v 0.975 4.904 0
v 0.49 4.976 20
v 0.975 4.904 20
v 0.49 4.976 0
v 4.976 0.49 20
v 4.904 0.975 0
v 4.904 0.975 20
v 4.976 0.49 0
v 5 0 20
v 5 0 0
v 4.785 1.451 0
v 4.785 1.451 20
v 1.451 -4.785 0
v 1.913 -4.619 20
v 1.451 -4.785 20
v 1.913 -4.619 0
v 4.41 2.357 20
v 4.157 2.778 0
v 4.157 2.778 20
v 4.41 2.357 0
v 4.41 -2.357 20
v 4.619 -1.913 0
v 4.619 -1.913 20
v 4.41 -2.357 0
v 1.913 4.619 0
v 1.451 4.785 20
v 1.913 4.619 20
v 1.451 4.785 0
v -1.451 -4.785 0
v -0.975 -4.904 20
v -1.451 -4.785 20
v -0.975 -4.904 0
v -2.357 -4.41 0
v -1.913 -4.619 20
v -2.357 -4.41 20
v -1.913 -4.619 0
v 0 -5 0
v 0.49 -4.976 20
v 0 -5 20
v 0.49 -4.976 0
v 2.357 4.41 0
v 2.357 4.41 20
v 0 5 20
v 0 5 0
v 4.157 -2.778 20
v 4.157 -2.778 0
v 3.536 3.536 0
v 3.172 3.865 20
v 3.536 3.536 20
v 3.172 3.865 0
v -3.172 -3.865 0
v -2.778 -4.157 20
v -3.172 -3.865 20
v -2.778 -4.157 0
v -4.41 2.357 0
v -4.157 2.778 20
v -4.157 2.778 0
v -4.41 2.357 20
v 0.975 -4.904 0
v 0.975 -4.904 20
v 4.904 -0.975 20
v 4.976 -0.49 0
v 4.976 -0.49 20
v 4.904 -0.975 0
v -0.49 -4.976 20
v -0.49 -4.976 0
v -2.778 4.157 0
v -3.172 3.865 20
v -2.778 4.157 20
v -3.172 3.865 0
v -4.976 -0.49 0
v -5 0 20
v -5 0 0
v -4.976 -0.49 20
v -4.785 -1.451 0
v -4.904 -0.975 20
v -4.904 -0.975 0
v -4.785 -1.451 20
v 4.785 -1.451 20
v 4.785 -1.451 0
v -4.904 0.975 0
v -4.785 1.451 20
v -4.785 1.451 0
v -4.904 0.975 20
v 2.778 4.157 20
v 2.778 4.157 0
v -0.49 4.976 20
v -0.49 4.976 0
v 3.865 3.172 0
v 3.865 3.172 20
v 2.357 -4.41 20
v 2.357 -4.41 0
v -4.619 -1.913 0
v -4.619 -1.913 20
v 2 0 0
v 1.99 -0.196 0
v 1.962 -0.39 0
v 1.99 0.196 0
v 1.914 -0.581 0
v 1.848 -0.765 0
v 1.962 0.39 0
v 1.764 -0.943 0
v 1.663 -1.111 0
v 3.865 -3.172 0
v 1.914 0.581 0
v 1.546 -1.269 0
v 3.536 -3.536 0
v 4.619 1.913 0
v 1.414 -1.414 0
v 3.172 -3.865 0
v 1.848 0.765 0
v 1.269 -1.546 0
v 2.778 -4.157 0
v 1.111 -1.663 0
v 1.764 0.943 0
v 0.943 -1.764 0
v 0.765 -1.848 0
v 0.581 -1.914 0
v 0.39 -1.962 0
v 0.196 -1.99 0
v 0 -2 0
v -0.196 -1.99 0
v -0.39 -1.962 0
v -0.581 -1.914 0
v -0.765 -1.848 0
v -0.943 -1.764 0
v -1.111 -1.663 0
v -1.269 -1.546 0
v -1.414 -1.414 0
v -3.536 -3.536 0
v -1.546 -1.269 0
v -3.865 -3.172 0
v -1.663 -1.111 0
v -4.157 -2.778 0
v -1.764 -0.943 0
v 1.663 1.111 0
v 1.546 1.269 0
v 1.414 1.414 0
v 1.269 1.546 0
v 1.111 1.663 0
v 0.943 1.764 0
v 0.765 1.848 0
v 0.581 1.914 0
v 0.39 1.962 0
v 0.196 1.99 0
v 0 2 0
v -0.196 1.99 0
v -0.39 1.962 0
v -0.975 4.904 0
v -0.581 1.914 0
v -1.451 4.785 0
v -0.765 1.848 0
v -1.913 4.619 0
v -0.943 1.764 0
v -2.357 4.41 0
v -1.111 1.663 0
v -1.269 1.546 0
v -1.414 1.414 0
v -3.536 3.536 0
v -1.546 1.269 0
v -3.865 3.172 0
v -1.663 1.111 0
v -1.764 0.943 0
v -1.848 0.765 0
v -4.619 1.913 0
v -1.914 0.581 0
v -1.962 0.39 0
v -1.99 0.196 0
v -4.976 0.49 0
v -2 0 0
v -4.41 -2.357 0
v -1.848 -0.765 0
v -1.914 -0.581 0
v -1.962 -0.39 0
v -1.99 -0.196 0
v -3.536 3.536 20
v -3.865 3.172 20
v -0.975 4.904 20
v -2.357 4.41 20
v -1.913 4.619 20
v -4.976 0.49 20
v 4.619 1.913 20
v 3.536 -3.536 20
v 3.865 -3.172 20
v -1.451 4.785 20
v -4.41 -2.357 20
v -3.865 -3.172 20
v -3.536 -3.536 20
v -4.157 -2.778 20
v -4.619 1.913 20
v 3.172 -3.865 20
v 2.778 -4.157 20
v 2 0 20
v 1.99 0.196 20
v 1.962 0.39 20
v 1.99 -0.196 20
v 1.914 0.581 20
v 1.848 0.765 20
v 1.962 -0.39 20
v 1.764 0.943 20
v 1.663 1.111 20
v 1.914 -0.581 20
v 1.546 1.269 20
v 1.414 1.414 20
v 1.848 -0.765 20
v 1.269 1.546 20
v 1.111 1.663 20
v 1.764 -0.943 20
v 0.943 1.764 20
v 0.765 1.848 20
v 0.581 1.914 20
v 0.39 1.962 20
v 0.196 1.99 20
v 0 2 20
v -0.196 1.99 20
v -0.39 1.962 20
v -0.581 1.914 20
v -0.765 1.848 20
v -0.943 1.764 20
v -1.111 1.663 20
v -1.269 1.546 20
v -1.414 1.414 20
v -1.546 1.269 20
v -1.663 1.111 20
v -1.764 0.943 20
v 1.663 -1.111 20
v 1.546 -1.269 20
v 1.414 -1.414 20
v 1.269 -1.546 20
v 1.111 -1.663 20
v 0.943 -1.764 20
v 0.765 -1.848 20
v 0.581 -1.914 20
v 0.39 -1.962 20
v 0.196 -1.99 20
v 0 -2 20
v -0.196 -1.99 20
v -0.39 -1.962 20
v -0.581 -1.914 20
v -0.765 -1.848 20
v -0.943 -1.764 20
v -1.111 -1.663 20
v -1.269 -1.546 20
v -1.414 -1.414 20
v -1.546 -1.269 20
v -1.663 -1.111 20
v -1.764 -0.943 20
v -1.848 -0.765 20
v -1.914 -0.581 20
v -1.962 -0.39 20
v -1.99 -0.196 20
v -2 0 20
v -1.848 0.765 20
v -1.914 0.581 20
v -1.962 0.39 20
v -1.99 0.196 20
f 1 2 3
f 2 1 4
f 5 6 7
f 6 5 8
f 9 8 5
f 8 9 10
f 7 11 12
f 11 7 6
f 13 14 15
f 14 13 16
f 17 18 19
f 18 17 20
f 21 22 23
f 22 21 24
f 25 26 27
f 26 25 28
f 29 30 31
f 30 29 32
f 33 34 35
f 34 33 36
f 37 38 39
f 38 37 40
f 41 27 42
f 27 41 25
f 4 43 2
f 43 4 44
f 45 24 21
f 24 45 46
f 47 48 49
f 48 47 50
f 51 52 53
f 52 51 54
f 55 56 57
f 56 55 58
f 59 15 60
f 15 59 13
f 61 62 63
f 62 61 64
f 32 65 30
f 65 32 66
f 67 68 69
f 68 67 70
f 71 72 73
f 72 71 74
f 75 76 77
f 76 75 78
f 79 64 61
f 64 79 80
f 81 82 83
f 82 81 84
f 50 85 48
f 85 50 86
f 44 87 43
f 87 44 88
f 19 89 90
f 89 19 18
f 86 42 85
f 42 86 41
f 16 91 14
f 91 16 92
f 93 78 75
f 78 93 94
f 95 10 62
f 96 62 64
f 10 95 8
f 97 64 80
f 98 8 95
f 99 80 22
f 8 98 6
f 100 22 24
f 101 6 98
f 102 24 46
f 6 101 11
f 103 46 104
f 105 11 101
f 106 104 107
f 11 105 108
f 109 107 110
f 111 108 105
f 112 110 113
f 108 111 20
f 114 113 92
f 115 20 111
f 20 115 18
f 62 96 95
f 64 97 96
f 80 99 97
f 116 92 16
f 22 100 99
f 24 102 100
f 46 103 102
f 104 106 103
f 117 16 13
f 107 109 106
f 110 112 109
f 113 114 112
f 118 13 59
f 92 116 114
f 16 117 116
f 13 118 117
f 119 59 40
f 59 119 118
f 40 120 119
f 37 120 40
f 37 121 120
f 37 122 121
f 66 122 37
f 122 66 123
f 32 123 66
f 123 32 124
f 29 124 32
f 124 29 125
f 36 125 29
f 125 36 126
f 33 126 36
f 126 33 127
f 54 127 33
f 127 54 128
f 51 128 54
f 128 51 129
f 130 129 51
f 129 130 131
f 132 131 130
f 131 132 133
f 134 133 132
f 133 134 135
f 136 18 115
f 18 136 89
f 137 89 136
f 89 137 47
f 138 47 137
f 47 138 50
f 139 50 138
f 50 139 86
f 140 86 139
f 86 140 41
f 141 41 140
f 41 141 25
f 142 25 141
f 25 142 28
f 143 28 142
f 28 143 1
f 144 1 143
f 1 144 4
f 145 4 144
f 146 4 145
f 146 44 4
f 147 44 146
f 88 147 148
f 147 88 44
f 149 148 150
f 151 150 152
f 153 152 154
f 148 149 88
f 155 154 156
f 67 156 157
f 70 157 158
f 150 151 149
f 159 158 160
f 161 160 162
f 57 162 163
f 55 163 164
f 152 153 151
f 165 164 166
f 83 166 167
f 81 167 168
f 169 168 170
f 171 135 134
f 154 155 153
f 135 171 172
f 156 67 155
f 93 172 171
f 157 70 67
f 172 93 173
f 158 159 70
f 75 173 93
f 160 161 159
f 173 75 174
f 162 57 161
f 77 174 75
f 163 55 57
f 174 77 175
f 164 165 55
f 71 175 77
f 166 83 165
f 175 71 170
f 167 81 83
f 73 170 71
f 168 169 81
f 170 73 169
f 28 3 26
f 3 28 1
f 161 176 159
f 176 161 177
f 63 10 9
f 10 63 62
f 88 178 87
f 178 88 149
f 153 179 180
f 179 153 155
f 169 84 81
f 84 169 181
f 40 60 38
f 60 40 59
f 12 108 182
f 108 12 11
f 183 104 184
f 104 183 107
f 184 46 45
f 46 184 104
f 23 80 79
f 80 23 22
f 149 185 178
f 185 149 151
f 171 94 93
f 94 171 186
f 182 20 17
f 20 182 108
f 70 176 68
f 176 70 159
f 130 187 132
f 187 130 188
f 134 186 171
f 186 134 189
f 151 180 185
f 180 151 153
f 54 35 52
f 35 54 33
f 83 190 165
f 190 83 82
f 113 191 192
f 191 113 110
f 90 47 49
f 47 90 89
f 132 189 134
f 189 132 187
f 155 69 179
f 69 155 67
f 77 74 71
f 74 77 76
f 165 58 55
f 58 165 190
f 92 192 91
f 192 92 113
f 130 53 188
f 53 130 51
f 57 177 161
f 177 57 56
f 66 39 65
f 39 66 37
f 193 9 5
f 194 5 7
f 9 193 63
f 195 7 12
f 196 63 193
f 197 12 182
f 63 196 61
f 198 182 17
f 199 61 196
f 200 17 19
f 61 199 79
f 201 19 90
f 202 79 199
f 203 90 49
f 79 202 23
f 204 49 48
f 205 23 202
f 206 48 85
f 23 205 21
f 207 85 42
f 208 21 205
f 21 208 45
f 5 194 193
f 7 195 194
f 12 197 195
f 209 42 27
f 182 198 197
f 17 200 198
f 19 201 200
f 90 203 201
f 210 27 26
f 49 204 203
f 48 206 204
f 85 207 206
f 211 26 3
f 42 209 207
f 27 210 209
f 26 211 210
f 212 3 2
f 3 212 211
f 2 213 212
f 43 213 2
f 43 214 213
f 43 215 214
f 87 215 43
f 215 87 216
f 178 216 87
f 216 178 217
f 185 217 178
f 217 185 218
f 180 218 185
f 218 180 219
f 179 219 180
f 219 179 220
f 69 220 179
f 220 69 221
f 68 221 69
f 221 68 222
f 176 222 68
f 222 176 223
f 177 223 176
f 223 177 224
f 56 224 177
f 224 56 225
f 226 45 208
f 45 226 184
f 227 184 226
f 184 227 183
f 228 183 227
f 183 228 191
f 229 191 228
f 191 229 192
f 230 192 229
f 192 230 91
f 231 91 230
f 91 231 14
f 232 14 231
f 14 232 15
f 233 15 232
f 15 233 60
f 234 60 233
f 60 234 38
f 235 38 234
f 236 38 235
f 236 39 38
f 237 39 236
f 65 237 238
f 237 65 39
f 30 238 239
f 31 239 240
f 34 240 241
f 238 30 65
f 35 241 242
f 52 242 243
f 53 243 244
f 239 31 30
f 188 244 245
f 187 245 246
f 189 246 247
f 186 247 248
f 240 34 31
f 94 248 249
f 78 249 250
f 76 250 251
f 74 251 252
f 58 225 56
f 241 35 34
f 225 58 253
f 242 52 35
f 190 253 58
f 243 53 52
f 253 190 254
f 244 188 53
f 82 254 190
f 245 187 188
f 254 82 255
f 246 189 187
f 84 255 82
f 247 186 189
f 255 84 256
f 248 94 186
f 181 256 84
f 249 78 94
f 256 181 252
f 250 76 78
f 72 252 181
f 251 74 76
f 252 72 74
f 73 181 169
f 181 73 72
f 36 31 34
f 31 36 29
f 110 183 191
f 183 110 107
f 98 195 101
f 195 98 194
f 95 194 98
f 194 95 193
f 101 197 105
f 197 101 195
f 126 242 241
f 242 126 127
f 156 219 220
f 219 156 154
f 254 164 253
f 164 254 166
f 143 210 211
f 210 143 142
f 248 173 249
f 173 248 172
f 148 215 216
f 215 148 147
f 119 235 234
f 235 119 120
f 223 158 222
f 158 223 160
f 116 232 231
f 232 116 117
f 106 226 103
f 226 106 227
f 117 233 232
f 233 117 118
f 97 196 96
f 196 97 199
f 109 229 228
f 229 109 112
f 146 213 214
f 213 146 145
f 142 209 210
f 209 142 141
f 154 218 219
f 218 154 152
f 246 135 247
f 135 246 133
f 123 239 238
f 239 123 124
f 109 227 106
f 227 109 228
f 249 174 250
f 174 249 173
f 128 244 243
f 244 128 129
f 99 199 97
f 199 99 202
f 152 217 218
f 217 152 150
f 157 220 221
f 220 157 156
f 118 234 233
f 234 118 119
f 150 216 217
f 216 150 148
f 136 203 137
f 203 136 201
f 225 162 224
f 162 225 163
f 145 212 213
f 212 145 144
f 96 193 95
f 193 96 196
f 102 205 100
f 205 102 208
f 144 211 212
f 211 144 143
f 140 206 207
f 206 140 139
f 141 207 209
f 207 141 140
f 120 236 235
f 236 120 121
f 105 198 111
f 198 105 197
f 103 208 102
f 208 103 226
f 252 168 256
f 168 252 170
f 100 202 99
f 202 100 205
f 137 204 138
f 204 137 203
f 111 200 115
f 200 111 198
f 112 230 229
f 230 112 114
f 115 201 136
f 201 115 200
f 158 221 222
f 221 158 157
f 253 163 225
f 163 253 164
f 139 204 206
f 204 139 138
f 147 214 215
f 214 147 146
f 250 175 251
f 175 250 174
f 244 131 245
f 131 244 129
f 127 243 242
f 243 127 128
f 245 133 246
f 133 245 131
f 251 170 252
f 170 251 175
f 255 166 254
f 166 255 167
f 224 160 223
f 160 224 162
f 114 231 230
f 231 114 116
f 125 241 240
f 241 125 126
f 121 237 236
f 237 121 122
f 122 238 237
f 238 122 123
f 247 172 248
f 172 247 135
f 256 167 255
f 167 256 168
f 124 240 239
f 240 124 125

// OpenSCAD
$fn = 64;

height = 20;
inner_d = 4;
outer_d = 10;

difference() {
  cylinder(h = height, d = outer_d);
  cylinder(h = height, d = inner_d);
}
